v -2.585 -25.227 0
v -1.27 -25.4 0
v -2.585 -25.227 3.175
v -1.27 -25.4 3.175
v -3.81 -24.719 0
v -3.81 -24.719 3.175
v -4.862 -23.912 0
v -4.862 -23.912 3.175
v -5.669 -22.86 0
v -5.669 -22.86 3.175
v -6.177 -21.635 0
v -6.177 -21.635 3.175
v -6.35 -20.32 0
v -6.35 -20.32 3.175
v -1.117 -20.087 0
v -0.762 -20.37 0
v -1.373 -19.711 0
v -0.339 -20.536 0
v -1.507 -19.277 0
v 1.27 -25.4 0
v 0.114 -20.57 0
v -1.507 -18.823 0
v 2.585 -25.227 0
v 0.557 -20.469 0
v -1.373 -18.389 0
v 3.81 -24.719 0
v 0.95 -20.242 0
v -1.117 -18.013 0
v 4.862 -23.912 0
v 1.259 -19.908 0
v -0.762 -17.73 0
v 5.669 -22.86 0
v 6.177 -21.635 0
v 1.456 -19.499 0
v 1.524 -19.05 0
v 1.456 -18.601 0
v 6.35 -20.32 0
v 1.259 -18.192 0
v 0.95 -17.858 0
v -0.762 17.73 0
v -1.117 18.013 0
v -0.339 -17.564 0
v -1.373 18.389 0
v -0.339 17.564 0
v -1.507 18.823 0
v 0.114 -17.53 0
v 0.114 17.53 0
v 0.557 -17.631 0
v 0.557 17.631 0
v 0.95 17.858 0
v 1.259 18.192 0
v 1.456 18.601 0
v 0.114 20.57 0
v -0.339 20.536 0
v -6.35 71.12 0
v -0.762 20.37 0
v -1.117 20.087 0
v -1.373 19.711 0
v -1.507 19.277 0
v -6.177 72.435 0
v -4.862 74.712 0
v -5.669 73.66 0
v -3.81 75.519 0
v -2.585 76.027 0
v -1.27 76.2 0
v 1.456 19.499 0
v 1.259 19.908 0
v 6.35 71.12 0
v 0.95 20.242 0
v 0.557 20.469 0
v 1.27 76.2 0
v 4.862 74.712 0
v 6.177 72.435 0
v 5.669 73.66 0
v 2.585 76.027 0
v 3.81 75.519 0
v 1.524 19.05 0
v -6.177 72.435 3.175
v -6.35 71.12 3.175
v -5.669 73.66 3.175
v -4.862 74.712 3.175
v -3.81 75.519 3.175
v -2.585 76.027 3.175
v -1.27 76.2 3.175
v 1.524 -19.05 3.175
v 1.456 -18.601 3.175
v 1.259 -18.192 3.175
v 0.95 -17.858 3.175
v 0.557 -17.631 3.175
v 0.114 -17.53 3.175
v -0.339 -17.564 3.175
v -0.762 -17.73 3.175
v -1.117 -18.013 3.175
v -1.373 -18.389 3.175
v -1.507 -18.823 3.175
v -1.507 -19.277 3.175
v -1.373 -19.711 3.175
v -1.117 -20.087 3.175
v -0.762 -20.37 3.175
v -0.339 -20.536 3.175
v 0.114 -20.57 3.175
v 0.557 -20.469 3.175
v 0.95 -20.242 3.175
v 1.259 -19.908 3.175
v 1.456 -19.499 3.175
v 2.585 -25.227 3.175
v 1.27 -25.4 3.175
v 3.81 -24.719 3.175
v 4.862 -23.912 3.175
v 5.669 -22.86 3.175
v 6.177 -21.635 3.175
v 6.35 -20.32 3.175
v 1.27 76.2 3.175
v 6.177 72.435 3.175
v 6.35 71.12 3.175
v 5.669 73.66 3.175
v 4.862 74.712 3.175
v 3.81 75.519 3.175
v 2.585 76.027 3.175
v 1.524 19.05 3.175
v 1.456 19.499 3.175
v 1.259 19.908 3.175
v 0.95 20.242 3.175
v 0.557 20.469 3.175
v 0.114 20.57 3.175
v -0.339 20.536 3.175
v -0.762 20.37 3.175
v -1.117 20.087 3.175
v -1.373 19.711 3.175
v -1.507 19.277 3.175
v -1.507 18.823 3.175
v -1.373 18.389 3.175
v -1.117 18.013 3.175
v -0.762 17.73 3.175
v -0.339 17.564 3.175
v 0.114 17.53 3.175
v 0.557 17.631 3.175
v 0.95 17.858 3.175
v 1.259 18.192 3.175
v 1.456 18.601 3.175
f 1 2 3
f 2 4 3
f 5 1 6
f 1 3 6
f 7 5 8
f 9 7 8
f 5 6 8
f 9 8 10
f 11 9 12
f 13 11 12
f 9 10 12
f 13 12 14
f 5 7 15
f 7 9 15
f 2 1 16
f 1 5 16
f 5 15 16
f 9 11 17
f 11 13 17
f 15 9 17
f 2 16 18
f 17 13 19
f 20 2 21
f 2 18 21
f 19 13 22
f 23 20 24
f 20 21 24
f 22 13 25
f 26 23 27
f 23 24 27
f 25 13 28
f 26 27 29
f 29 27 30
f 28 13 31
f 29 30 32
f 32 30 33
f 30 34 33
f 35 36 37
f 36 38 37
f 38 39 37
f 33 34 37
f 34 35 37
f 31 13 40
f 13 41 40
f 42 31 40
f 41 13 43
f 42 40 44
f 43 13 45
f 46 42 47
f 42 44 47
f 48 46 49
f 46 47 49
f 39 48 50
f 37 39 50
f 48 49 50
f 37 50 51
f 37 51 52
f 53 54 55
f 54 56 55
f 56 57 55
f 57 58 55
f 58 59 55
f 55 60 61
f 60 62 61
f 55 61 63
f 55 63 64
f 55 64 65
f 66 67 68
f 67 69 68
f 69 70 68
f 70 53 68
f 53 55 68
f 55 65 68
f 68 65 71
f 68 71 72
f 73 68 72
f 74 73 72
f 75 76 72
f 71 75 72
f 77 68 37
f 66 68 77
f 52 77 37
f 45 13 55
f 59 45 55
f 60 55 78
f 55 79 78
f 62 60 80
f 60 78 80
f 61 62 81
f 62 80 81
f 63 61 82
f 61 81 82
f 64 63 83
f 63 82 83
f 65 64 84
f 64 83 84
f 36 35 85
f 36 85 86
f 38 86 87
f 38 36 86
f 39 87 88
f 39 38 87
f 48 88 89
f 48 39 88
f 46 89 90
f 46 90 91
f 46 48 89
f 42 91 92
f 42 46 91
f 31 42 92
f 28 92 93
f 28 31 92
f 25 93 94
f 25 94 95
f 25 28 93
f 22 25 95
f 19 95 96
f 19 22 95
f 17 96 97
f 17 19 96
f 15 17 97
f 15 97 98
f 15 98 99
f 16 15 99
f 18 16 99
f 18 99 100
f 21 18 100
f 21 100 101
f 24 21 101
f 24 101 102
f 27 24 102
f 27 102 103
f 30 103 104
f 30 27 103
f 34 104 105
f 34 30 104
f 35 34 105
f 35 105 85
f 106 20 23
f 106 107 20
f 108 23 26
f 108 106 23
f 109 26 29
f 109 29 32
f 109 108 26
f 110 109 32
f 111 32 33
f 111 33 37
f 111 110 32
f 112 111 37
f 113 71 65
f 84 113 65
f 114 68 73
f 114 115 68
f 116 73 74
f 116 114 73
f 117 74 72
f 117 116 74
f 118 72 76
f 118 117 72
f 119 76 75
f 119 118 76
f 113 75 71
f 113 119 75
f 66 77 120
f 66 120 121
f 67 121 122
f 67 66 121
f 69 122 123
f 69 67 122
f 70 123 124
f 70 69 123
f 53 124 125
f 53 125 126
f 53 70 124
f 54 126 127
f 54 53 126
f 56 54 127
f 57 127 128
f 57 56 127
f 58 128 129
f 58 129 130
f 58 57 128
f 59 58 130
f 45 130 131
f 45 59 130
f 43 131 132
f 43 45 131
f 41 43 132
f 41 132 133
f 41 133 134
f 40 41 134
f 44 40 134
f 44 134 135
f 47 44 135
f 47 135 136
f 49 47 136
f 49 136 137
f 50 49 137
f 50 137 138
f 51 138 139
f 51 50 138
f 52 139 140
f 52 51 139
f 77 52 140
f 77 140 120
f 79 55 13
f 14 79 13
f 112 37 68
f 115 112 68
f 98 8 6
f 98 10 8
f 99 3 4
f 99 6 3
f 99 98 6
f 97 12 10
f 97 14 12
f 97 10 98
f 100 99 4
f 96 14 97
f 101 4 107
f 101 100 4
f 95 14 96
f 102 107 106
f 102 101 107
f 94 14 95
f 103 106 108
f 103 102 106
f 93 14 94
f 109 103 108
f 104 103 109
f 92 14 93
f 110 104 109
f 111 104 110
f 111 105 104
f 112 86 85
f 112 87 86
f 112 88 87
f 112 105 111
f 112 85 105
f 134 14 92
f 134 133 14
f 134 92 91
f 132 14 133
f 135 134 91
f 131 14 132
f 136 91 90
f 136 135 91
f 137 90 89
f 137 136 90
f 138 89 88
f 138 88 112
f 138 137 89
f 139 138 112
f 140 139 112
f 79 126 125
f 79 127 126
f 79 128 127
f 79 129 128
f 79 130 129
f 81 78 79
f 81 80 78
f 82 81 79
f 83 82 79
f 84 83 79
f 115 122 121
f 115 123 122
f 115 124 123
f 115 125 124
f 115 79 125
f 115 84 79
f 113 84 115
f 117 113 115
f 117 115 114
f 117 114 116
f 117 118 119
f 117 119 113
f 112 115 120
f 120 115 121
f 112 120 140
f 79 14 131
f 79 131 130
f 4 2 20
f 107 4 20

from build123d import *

# Parameters (mm, degrees)
F0_R     = 1.524
F1_DEPTH = 3.175
F2_R     = 5.08


# Not quite as in the source:
# - a feature names something its author has since deleted; it is built from what else it names


with BuildPart() as f1:
    # F0 (on Top) → F1 (new body)
    with BuildSketch(Plane.XY):
        Polygon((-6.35, -25.4), (6.35, -25.4), (6.35, 25.4), (6.35, 76.2), (-6.35, 76.2), (-6.35, 25.4), align=None)
        with Locations((0, -19.05)):
            Circle(F0_R, mode=Mode.SUBTRACT)
        with Locations((0, 19.05)):
            Circle(F0_R, mode=Mode.SUBTRACT)
    extrude(amount=F1_DEPTH)

    # F2
    f2_edges = [f1.edges().sort_by_distance(p)[0] for p in [
        (-6.35, 76.2, 1.5875),
        (6.35, 76.2, 1.5875),
        (-6.35, -25.4, 1.5875),
        (6.35, -25.4, 1.5875),
    ]]
    fillet(f2_edges, radius=F2_R)


solid = f1.part
